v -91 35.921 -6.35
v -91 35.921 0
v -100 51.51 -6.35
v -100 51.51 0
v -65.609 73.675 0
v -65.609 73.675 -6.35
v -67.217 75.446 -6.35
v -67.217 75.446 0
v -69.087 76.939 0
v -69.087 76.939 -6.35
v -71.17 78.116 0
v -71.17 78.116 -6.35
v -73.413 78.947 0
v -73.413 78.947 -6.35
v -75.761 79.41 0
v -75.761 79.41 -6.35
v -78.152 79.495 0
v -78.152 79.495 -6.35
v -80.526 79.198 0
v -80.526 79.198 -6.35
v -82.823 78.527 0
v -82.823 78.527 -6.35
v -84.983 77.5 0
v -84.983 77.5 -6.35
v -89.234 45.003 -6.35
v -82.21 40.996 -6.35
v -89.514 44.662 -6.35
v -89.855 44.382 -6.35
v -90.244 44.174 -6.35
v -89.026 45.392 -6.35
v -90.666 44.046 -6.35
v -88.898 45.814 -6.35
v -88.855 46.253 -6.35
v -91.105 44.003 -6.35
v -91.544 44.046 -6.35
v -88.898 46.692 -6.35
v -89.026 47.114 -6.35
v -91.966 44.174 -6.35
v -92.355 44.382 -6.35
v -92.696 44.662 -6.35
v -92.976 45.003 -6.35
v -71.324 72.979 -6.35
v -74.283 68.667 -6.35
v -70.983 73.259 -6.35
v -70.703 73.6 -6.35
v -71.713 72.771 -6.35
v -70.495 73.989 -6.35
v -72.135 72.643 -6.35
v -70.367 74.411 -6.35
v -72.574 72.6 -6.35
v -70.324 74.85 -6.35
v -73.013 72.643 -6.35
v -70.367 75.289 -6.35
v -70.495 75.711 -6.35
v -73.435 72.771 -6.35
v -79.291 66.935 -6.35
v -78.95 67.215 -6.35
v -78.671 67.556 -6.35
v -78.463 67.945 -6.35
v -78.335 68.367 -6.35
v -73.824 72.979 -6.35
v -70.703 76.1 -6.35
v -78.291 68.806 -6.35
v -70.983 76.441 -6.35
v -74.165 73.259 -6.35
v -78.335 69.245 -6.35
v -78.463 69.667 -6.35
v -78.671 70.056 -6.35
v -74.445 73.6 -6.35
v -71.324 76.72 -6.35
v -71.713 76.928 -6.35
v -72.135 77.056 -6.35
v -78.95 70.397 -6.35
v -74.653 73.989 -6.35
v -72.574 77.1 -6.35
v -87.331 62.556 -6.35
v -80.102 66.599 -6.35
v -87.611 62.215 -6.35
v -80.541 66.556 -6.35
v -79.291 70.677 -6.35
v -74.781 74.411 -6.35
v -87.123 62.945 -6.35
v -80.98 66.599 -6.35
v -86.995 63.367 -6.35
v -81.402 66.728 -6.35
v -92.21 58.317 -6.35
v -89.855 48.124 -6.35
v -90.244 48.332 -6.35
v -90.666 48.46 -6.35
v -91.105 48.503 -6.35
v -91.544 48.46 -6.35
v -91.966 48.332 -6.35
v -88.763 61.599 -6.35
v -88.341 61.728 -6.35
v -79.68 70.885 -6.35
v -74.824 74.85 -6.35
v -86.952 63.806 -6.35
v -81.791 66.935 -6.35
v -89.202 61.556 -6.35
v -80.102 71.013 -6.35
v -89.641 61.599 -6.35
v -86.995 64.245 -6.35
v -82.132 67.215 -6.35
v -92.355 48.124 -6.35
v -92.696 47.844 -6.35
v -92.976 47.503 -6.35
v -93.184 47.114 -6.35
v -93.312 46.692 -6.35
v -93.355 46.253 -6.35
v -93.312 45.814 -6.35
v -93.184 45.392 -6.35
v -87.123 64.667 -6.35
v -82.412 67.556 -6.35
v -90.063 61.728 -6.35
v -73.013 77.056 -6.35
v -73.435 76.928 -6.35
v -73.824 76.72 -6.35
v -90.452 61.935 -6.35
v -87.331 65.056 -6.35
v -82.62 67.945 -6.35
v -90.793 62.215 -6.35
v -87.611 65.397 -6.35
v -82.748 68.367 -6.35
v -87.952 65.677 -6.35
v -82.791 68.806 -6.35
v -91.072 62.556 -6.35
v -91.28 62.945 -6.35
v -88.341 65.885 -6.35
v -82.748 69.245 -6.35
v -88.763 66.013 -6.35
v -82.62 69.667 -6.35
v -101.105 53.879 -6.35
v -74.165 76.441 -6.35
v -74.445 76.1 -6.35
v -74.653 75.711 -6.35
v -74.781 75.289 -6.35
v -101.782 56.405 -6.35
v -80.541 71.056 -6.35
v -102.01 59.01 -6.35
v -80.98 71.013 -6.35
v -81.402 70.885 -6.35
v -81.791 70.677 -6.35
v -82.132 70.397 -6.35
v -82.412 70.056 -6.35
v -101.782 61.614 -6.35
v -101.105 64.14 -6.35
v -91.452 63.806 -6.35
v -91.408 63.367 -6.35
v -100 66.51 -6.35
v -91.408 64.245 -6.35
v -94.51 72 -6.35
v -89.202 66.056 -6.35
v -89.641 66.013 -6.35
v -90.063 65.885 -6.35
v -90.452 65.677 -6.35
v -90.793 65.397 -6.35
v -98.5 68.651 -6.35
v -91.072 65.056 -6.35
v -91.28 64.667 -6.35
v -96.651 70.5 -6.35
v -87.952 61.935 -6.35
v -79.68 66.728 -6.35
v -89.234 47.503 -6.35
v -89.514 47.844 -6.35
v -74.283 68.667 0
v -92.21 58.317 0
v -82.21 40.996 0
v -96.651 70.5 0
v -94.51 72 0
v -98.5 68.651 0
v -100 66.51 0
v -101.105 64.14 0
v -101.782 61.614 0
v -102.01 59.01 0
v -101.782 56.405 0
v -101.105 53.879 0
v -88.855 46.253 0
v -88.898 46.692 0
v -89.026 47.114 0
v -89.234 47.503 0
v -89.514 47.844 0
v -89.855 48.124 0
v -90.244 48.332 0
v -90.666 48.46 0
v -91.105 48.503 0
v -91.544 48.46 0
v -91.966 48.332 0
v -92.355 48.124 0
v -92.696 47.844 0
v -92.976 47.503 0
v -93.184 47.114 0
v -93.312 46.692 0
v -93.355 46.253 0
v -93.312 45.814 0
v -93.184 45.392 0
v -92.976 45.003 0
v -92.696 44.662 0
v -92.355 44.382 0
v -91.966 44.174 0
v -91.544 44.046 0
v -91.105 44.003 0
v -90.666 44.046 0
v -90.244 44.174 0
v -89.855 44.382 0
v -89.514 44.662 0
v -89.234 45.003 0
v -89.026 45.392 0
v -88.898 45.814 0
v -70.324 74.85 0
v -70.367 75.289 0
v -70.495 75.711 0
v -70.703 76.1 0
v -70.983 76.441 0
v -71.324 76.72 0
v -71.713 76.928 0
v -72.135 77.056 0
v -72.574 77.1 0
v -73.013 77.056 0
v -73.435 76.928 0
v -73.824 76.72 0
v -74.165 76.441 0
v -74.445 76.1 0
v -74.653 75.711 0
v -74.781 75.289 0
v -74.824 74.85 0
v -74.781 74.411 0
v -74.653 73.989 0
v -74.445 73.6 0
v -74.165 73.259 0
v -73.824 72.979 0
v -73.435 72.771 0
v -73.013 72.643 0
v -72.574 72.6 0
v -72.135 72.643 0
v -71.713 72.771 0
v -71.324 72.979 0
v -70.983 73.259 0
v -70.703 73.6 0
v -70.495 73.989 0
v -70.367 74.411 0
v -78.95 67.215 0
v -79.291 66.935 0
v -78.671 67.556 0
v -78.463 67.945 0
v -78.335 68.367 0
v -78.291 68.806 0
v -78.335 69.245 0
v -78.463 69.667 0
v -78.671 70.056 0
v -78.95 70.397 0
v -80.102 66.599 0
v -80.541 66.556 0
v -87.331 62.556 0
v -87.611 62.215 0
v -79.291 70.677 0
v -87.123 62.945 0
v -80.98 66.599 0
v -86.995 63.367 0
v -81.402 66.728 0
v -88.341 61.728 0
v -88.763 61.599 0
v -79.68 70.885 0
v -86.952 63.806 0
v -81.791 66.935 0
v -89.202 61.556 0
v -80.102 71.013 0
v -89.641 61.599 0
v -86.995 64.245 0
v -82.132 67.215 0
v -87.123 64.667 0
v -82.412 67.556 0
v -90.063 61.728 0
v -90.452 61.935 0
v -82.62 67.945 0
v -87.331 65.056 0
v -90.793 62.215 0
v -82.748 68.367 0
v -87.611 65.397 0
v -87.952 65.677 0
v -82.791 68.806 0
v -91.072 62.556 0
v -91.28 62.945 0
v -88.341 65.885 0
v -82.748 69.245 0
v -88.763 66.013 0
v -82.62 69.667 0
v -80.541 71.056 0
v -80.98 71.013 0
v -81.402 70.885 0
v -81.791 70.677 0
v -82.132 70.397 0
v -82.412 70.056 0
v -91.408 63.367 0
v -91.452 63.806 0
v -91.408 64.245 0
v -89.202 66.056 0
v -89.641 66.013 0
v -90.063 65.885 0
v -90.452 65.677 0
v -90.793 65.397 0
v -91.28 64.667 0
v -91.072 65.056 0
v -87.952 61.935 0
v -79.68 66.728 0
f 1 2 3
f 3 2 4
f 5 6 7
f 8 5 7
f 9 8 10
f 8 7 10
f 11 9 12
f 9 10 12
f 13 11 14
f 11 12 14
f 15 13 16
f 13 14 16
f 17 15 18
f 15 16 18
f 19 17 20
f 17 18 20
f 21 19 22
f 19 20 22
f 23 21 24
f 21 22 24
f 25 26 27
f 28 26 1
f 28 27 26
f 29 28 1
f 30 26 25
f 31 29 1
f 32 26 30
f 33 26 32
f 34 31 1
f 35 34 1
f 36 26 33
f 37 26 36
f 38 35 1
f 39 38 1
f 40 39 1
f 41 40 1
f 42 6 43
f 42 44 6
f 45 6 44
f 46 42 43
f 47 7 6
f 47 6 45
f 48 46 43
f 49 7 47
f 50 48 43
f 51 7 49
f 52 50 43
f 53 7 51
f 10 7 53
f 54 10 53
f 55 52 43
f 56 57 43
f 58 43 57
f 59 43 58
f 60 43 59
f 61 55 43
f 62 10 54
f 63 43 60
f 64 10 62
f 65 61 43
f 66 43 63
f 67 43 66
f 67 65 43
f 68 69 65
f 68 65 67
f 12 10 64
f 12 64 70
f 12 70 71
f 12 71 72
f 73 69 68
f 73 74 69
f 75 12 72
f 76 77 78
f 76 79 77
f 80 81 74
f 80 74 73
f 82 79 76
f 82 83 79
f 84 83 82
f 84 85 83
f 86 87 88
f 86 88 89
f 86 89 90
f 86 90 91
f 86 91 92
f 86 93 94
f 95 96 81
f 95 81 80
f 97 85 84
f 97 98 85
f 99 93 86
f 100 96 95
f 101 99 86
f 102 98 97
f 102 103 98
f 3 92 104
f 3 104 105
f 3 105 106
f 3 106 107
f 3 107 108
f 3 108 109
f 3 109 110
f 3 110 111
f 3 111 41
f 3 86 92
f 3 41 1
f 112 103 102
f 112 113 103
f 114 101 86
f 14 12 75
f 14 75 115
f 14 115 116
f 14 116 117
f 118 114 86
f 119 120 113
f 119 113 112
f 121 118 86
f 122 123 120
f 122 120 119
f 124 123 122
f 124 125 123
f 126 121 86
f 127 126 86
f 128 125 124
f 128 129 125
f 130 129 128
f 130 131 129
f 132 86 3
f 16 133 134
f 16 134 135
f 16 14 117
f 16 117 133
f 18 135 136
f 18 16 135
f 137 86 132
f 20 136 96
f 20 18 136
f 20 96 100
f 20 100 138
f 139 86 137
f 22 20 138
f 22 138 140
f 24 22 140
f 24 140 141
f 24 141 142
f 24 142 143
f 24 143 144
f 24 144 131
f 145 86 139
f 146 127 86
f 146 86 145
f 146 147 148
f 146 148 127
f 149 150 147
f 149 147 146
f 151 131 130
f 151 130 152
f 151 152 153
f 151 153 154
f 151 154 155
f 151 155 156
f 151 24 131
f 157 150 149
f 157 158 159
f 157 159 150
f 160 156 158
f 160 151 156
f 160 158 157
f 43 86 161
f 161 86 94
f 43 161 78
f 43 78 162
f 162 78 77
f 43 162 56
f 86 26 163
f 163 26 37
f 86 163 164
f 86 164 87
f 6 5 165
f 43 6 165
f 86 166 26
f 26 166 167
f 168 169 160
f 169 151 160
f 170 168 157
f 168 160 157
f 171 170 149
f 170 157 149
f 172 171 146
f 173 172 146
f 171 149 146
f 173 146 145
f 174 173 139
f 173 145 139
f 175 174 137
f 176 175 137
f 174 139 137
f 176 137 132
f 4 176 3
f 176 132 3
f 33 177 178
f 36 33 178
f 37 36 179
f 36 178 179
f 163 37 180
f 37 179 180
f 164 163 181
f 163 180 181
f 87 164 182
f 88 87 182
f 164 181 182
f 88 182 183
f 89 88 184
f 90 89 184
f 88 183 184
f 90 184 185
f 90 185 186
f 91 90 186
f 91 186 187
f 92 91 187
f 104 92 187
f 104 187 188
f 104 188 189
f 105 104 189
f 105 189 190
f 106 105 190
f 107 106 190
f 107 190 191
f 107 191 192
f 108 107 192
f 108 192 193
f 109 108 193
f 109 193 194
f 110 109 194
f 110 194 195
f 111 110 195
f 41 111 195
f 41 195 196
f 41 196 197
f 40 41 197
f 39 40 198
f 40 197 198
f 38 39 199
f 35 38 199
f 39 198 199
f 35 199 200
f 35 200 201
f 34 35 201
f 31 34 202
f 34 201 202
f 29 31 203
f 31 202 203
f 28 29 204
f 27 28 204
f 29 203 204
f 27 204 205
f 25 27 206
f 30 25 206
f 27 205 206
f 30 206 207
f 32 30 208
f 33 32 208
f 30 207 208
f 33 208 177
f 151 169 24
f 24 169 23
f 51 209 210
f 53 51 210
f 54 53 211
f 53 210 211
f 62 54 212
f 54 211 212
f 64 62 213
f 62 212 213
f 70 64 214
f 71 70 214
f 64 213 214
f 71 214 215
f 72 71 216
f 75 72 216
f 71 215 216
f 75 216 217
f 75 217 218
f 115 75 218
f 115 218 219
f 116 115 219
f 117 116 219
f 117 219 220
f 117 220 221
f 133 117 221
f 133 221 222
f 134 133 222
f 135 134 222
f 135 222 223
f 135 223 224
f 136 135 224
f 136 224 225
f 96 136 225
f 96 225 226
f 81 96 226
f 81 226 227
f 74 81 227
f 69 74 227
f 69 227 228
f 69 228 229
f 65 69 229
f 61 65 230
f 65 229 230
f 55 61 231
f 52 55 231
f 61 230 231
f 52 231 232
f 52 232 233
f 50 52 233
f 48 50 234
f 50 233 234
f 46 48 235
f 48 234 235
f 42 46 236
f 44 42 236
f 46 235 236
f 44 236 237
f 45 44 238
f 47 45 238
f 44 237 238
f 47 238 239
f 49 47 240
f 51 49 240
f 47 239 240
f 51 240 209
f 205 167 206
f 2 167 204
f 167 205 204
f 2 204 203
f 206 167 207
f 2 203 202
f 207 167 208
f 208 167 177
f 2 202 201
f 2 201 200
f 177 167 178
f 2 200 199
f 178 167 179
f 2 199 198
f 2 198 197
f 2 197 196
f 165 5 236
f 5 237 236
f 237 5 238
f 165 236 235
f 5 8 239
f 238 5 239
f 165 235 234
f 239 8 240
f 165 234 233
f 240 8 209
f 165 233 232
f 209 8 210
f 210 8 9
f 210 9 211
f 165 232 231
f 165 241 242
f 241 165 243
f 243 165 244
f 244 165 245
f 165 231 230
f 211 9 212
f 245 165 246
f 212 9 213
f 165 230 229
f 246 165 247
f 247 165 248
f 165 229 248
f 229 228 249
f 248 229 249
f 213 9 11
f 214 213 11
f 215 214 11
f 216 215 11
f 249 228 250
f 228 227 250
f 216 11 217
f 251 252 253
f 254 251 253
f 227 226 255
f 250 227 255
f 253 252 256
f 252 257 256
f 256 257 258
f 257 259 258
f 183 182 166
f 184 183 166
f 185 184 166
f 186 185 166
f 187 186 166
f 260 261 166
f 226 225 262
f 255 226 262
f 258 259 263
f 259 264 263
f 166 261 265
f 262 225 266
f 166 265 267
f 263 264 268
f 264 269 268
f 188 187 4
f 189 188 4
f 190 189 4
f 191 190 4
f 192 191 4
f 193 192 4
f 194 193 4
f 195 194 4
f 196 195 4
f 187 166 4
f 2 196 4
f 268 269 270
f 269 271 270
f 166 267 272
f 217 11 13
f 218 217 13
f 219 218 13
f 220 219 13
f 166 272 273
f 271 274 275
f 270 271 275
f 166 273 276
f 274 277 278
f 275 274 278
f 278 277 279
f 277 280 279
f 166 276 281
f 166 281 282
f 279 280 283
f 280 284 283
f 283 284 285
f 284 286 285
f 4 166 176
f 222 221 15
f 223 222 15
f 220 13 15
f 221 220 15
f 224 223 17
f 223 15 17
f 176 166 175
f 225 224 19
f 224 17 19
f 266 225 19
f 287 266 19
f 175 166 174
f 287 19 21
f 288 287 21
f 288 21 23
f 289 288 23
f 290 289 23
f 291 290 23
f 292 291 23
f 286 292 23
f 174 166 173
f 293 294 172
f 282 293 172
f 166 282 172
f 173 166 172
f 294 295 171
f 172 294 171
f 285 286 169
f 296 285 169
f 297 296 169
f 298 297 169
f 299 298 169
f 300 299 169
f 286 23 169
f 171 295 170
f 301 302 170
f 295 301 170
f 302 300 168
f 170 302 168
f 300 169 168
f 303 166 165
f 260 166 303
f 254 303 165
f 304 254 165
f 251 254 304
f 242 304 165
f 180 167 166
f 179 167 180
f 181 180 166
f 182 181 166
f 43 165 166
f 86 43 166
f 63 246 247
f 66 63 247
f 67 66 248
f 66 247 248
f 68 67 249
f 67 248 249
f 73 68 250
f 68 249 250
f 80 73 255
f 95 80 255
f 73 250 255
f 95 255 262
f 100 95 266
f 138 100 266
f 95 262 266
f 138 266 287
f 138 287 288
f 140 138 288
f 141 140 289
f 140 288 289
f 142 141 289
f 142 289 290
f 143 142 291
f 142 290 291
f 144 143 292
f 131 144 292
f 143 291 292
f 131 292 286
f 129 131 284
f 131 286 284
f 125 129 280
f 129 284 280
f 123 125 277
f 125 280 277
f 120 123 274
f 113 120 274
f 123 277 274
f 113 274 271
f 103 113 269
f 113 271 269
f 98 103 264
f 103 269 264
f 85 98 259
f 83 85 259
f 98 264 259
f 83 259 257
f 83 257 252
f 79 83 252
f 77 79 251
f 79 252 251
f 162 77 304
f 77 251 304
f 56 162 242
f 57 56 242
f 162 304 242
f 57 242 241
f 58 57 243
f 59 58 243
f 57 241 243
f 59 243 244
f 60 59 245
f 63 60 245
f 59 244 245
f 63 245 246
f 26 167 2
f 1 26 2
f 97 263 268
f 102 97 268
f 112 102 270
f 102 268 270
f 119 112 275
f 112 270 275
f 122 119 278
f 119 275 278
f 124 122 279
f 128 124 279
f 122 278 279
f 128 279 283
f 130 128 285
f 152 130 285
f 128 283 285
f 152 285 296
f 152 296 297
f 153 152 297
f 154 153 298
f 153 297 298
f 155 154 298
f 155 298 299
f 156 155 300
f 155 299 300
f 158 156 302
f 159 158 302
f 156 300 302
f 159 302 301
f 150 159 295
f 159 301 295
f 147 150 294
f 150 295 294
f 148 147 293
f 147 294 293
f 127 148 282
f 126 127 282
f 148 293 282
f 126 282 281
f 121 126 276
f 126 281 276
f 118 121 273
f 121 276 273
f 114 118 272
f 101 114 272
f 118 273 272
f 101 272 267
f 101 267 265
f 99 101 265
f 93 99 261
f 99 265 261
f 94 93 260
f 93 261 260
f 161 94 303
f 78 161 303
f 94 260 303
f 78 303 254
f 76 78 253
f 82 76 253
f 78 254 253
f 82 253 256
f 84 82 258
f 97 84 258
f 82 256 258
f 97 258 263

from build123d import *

# Parameters (mm, degrees)
ESQUISSE3_W                   = 53.75
ESQUISSE3_H                   = 73.333333334
BOSS_EXTRU_2_DEPTH            = 6.35
CONG_6_R                      = 20
CONG_7_R                      = 15
ESQUISSE4_R                   = 2.25
ENL_V_MAT_EXTRU_2_DEPTH       = 6.35
SYM_TRIE2_COPY_1_SKETCH_R     = 2.25
SYM_TRIE2_COPY_1_DEPTH        = 6.35
DIAM_TRE_DU_PER_AGE_4_0_4_1_D = 4
ESQUISSE9_OUTSIDE_W           = 257.77
ESQUISSE9_OUTSIDE_H           = 212.77
ENL_V_MAT_EXTRU_3_DEPTH       = 130.491560966
ESQUISSE10_R                  = 2.25
ENL_V_MAT_EXTRU_4_DEPTH       = 130.491560966


with BuildPart() as part:
    # Esquisse3 → Boss.-Extru.2 (new body)
    with BuildSketch(Plane.XY):
        Polygon((-54.672450369, 55), (54.672450369, 55), (71.992958445, 85), (107.5, 64.5), (77.5, 12.538475773), (77.5, -12.538475773), (107.5, -64.5), (71.992958445, -85), (54.672450369, -55), (-54.672450369, -55), (-71.992958445, -85), (-107.5, -64.5), (-77.5, -12.538475773), (-77.5, 12.538475773), (-107.5, 64.5), (-71.992958445, 85), align=None)
        Rectangle(ESQUISSE3_W, ESQUISSE3_H, mode=Mode.SUBTRACT)
    extrude(amount=-BOSS_EXTRU_2_DEPTH)

    # Congé6
    cong_6_edges = [part.edges().sort_by_distance(p)[0] for p in [
        (-54.672450369, 55, -3.175),
        (54.672450369, 55, -3.175),
        (77.5, 12.538475773, -3.175),
        (77.5, -12.538475773, -3.175),
        (54.672450369, -55, -3.175),
        (-54.672450369, -55, -3.175),
        (-77.5, -12.538475773, -3.175),
        (-77.5, 12.538475773, -3.175),
        (-26.875, -36.666666667, -3.175),
        (-26.875, 36.666666667, -3.175),
        (26.875, 36.666666667, -3.175),
        (26.875, -36.666666667, -3.175),
    ]]
    fillet(cong_6_edges, radius=CONG_6_R)

    # Congé7
    cong_7_edges = [part.edges().sort_by_distance(p)[0] for p in [
        (71.992958445, 85, -3.175),
        (107.5, 64.5, -3.175),
        (107.5, -64.5, -3.175),
        (71.992958445, -85, -3.175),
        (-71.992958445, -85, -3.175),
        (-107.5, -64.5, -3.175),
        (-107.5, 64.5, -3.175),
        (-71.992958445, 85, -3.175),
    ]]
    fillet(cong_7_edges, radius=CONG_7_R)

    # Esquisse4 → Enlèv. mat.-Extru.2 (cut)
    with BuildSketch(Plane.XY):
        with Locations((-56.291352203, 26.80402023)):
            Circle(ESQUISSE4_R)
        with Locations((-64.951606241, 21.80402023)):
            Circle(ESQUISSE4_R)
        with Locations((-89.201606241, 63.806252313)):
            Circle(ESQUISSE4_R)
        with Locations((-80.541352203, 68.806252313)):
            Circle(ESQUISSE4_R)
        Polygon((-53.283116293, 32.293602792), (-74.283116293, 68.666669751), (-92.209842152, 58.316669751), (-71.209842152, 21.943602792), align=None)
        with BuildLine():
            Line((-51.695036381, 4.342967697), (-54.695036381, 9.53912012))
            ThreePointArc((-54.695036381, 9.53912012), (-53.871479222, 12.612677278), (-50.797922064, 11.78912012))
            Line((-50.797922064, 11.78912012), (-47.797922064, 6.592967697))
            ThreePointArc((-47.797922064, 6.592967697), (-48.621479222, 3.519410539), (-51.695036381, 4.342967697))
        make_face()
    enl_v_mat_extru_2 = extrude(amount=-ENL_V_MAT_EXTRU_2_DEPTH, mode=Mode.SUBTRACT)

    # Symétrie1: Enlèv. mat.-Extru.2 across plane
    add(enl_v_mat_extru_2.mirror(Plane.ZX), mode=Mode.SUBTRACT)

    # Symétrie2: Enlèv. mat.-Extru.2 across plane
    add(enl_v_mat_extru_2.mirror(Plane(origin=(0, 0, 0), x_dir=(0, 0, 1), z_dir=(1, 0, 0))), mode=Mode.SUBTRACT)

    # Symétrie2 copy 1 sketch → Symétrie2 copy 1 (cut)
    with BuildSketch(Plane(origin=(0, 0, 0), x_dir=(-1, 0, 0), z_dir=(0, 0, 1))):
        with Locations((-56.291352203, 26.80402023)):
            Circle(SYM_TRIE2_COPY_1_SKETCH_R)
        with Locations((-64.951606241, 21.80402023)):
            Circle(SYM_TRIE2_COPY_1_SKETCH_R)
        with Locations((-89.201606241, 63.806252313)):
            Circle(SYM_TRIE2_COPY_1_SKETCH_R)
        with Locations((-80.541352203, 68.806252313)):
            Circle(SYM_TRIE2_COPY_1_SKETCH_R)
        Polygon((-53.283116293, 32.293602792), (-74.283116293, 68.666669751), (-92.209842152, 58.316669751), (-71.209842152, 21.943602792), align=None)
        with BuildLine():
            Line((-51.695036381, 4.342967697), (-54.695036381, 9.53912012))
            ThreePointArc((-54.695036381, 9.53912012), (-53.871479222, 12.612677278), (-50.797922064, 11.78912012))
            Line((-50.797922064, 11.78912012), (-47.797922064, 6.592967697))
            ThreePointArc((-47.797922064, 6.592967697), (-48.621479222, 3.519410539), (-51.695036381, 4.342967697))
        make_face()
    extrude(amount=-SYM_TRIE2_COPY_1_DEPTH, mode=Mode.SUBTRACT)

    # Diamètre du perçage Ø4.0 (4)1 (through all)
    with Locations(Plane.XY):
        with Locations((33, 48), (-33, 48), (-33, -48), (33, -48)):
            Hole(DIAM_TRE_DU_PER_AGE_4_0_4_1_D / 2)

    # Esquisse9 outside → Enlèv. mat.-Extru.3 (cut, through all)
    with BuildSketch(Plane.XY):
        Rectangle(ESQUISSE9_OUTSIDE_W, ESQUISSE9_OUTSIDE_H)
        with BuildLine():
            Line((-65.608946312, 73.674704124), (-92.209842152, 58.316669751))
            Line((-92.209842152, 58.316669751), (-82.209842152, 40.996161675))
            Line((-82.209842152, 40.996161675), (-91, 35.921161675))
            Line((-91, 35.921161675), (-100, 51.509618943))
            ThreePointArc((-100, 51.509618943), (-101.498506338, 62.89190462), (-94.509618943, 72))
            Line((-94.509618943, 72), (-84.983339502, 77.5))
            ThreePointArc((-84.983339502, 77.5), (-74.577818709, 79.225526966), (-65.608946312, 73.674704124))
        make_face(mode=Mode.SUBTRACT)
    extrude(amount=-ENL_V_MAT_EXTRU_3_DEPTH, mode=Mode.SUBTRACT)

    # Esquisse10 → Enlèv. mat.-Extru.4 (cut, through all)
    with BuildSketch(Plane.XY):
        with Locations((-91.104921076, 46.252890309)):
            Circle(ESQUISSE10_R)
        with Locations((-72.574022775, 74.849567776)):
            Circle(ESQUISSE10_R)
    extrude(amount=-ENL_V_MAT_EXTRU_4_DEPTH, mode=Mode.SUBTRACT)


solid = part.part
